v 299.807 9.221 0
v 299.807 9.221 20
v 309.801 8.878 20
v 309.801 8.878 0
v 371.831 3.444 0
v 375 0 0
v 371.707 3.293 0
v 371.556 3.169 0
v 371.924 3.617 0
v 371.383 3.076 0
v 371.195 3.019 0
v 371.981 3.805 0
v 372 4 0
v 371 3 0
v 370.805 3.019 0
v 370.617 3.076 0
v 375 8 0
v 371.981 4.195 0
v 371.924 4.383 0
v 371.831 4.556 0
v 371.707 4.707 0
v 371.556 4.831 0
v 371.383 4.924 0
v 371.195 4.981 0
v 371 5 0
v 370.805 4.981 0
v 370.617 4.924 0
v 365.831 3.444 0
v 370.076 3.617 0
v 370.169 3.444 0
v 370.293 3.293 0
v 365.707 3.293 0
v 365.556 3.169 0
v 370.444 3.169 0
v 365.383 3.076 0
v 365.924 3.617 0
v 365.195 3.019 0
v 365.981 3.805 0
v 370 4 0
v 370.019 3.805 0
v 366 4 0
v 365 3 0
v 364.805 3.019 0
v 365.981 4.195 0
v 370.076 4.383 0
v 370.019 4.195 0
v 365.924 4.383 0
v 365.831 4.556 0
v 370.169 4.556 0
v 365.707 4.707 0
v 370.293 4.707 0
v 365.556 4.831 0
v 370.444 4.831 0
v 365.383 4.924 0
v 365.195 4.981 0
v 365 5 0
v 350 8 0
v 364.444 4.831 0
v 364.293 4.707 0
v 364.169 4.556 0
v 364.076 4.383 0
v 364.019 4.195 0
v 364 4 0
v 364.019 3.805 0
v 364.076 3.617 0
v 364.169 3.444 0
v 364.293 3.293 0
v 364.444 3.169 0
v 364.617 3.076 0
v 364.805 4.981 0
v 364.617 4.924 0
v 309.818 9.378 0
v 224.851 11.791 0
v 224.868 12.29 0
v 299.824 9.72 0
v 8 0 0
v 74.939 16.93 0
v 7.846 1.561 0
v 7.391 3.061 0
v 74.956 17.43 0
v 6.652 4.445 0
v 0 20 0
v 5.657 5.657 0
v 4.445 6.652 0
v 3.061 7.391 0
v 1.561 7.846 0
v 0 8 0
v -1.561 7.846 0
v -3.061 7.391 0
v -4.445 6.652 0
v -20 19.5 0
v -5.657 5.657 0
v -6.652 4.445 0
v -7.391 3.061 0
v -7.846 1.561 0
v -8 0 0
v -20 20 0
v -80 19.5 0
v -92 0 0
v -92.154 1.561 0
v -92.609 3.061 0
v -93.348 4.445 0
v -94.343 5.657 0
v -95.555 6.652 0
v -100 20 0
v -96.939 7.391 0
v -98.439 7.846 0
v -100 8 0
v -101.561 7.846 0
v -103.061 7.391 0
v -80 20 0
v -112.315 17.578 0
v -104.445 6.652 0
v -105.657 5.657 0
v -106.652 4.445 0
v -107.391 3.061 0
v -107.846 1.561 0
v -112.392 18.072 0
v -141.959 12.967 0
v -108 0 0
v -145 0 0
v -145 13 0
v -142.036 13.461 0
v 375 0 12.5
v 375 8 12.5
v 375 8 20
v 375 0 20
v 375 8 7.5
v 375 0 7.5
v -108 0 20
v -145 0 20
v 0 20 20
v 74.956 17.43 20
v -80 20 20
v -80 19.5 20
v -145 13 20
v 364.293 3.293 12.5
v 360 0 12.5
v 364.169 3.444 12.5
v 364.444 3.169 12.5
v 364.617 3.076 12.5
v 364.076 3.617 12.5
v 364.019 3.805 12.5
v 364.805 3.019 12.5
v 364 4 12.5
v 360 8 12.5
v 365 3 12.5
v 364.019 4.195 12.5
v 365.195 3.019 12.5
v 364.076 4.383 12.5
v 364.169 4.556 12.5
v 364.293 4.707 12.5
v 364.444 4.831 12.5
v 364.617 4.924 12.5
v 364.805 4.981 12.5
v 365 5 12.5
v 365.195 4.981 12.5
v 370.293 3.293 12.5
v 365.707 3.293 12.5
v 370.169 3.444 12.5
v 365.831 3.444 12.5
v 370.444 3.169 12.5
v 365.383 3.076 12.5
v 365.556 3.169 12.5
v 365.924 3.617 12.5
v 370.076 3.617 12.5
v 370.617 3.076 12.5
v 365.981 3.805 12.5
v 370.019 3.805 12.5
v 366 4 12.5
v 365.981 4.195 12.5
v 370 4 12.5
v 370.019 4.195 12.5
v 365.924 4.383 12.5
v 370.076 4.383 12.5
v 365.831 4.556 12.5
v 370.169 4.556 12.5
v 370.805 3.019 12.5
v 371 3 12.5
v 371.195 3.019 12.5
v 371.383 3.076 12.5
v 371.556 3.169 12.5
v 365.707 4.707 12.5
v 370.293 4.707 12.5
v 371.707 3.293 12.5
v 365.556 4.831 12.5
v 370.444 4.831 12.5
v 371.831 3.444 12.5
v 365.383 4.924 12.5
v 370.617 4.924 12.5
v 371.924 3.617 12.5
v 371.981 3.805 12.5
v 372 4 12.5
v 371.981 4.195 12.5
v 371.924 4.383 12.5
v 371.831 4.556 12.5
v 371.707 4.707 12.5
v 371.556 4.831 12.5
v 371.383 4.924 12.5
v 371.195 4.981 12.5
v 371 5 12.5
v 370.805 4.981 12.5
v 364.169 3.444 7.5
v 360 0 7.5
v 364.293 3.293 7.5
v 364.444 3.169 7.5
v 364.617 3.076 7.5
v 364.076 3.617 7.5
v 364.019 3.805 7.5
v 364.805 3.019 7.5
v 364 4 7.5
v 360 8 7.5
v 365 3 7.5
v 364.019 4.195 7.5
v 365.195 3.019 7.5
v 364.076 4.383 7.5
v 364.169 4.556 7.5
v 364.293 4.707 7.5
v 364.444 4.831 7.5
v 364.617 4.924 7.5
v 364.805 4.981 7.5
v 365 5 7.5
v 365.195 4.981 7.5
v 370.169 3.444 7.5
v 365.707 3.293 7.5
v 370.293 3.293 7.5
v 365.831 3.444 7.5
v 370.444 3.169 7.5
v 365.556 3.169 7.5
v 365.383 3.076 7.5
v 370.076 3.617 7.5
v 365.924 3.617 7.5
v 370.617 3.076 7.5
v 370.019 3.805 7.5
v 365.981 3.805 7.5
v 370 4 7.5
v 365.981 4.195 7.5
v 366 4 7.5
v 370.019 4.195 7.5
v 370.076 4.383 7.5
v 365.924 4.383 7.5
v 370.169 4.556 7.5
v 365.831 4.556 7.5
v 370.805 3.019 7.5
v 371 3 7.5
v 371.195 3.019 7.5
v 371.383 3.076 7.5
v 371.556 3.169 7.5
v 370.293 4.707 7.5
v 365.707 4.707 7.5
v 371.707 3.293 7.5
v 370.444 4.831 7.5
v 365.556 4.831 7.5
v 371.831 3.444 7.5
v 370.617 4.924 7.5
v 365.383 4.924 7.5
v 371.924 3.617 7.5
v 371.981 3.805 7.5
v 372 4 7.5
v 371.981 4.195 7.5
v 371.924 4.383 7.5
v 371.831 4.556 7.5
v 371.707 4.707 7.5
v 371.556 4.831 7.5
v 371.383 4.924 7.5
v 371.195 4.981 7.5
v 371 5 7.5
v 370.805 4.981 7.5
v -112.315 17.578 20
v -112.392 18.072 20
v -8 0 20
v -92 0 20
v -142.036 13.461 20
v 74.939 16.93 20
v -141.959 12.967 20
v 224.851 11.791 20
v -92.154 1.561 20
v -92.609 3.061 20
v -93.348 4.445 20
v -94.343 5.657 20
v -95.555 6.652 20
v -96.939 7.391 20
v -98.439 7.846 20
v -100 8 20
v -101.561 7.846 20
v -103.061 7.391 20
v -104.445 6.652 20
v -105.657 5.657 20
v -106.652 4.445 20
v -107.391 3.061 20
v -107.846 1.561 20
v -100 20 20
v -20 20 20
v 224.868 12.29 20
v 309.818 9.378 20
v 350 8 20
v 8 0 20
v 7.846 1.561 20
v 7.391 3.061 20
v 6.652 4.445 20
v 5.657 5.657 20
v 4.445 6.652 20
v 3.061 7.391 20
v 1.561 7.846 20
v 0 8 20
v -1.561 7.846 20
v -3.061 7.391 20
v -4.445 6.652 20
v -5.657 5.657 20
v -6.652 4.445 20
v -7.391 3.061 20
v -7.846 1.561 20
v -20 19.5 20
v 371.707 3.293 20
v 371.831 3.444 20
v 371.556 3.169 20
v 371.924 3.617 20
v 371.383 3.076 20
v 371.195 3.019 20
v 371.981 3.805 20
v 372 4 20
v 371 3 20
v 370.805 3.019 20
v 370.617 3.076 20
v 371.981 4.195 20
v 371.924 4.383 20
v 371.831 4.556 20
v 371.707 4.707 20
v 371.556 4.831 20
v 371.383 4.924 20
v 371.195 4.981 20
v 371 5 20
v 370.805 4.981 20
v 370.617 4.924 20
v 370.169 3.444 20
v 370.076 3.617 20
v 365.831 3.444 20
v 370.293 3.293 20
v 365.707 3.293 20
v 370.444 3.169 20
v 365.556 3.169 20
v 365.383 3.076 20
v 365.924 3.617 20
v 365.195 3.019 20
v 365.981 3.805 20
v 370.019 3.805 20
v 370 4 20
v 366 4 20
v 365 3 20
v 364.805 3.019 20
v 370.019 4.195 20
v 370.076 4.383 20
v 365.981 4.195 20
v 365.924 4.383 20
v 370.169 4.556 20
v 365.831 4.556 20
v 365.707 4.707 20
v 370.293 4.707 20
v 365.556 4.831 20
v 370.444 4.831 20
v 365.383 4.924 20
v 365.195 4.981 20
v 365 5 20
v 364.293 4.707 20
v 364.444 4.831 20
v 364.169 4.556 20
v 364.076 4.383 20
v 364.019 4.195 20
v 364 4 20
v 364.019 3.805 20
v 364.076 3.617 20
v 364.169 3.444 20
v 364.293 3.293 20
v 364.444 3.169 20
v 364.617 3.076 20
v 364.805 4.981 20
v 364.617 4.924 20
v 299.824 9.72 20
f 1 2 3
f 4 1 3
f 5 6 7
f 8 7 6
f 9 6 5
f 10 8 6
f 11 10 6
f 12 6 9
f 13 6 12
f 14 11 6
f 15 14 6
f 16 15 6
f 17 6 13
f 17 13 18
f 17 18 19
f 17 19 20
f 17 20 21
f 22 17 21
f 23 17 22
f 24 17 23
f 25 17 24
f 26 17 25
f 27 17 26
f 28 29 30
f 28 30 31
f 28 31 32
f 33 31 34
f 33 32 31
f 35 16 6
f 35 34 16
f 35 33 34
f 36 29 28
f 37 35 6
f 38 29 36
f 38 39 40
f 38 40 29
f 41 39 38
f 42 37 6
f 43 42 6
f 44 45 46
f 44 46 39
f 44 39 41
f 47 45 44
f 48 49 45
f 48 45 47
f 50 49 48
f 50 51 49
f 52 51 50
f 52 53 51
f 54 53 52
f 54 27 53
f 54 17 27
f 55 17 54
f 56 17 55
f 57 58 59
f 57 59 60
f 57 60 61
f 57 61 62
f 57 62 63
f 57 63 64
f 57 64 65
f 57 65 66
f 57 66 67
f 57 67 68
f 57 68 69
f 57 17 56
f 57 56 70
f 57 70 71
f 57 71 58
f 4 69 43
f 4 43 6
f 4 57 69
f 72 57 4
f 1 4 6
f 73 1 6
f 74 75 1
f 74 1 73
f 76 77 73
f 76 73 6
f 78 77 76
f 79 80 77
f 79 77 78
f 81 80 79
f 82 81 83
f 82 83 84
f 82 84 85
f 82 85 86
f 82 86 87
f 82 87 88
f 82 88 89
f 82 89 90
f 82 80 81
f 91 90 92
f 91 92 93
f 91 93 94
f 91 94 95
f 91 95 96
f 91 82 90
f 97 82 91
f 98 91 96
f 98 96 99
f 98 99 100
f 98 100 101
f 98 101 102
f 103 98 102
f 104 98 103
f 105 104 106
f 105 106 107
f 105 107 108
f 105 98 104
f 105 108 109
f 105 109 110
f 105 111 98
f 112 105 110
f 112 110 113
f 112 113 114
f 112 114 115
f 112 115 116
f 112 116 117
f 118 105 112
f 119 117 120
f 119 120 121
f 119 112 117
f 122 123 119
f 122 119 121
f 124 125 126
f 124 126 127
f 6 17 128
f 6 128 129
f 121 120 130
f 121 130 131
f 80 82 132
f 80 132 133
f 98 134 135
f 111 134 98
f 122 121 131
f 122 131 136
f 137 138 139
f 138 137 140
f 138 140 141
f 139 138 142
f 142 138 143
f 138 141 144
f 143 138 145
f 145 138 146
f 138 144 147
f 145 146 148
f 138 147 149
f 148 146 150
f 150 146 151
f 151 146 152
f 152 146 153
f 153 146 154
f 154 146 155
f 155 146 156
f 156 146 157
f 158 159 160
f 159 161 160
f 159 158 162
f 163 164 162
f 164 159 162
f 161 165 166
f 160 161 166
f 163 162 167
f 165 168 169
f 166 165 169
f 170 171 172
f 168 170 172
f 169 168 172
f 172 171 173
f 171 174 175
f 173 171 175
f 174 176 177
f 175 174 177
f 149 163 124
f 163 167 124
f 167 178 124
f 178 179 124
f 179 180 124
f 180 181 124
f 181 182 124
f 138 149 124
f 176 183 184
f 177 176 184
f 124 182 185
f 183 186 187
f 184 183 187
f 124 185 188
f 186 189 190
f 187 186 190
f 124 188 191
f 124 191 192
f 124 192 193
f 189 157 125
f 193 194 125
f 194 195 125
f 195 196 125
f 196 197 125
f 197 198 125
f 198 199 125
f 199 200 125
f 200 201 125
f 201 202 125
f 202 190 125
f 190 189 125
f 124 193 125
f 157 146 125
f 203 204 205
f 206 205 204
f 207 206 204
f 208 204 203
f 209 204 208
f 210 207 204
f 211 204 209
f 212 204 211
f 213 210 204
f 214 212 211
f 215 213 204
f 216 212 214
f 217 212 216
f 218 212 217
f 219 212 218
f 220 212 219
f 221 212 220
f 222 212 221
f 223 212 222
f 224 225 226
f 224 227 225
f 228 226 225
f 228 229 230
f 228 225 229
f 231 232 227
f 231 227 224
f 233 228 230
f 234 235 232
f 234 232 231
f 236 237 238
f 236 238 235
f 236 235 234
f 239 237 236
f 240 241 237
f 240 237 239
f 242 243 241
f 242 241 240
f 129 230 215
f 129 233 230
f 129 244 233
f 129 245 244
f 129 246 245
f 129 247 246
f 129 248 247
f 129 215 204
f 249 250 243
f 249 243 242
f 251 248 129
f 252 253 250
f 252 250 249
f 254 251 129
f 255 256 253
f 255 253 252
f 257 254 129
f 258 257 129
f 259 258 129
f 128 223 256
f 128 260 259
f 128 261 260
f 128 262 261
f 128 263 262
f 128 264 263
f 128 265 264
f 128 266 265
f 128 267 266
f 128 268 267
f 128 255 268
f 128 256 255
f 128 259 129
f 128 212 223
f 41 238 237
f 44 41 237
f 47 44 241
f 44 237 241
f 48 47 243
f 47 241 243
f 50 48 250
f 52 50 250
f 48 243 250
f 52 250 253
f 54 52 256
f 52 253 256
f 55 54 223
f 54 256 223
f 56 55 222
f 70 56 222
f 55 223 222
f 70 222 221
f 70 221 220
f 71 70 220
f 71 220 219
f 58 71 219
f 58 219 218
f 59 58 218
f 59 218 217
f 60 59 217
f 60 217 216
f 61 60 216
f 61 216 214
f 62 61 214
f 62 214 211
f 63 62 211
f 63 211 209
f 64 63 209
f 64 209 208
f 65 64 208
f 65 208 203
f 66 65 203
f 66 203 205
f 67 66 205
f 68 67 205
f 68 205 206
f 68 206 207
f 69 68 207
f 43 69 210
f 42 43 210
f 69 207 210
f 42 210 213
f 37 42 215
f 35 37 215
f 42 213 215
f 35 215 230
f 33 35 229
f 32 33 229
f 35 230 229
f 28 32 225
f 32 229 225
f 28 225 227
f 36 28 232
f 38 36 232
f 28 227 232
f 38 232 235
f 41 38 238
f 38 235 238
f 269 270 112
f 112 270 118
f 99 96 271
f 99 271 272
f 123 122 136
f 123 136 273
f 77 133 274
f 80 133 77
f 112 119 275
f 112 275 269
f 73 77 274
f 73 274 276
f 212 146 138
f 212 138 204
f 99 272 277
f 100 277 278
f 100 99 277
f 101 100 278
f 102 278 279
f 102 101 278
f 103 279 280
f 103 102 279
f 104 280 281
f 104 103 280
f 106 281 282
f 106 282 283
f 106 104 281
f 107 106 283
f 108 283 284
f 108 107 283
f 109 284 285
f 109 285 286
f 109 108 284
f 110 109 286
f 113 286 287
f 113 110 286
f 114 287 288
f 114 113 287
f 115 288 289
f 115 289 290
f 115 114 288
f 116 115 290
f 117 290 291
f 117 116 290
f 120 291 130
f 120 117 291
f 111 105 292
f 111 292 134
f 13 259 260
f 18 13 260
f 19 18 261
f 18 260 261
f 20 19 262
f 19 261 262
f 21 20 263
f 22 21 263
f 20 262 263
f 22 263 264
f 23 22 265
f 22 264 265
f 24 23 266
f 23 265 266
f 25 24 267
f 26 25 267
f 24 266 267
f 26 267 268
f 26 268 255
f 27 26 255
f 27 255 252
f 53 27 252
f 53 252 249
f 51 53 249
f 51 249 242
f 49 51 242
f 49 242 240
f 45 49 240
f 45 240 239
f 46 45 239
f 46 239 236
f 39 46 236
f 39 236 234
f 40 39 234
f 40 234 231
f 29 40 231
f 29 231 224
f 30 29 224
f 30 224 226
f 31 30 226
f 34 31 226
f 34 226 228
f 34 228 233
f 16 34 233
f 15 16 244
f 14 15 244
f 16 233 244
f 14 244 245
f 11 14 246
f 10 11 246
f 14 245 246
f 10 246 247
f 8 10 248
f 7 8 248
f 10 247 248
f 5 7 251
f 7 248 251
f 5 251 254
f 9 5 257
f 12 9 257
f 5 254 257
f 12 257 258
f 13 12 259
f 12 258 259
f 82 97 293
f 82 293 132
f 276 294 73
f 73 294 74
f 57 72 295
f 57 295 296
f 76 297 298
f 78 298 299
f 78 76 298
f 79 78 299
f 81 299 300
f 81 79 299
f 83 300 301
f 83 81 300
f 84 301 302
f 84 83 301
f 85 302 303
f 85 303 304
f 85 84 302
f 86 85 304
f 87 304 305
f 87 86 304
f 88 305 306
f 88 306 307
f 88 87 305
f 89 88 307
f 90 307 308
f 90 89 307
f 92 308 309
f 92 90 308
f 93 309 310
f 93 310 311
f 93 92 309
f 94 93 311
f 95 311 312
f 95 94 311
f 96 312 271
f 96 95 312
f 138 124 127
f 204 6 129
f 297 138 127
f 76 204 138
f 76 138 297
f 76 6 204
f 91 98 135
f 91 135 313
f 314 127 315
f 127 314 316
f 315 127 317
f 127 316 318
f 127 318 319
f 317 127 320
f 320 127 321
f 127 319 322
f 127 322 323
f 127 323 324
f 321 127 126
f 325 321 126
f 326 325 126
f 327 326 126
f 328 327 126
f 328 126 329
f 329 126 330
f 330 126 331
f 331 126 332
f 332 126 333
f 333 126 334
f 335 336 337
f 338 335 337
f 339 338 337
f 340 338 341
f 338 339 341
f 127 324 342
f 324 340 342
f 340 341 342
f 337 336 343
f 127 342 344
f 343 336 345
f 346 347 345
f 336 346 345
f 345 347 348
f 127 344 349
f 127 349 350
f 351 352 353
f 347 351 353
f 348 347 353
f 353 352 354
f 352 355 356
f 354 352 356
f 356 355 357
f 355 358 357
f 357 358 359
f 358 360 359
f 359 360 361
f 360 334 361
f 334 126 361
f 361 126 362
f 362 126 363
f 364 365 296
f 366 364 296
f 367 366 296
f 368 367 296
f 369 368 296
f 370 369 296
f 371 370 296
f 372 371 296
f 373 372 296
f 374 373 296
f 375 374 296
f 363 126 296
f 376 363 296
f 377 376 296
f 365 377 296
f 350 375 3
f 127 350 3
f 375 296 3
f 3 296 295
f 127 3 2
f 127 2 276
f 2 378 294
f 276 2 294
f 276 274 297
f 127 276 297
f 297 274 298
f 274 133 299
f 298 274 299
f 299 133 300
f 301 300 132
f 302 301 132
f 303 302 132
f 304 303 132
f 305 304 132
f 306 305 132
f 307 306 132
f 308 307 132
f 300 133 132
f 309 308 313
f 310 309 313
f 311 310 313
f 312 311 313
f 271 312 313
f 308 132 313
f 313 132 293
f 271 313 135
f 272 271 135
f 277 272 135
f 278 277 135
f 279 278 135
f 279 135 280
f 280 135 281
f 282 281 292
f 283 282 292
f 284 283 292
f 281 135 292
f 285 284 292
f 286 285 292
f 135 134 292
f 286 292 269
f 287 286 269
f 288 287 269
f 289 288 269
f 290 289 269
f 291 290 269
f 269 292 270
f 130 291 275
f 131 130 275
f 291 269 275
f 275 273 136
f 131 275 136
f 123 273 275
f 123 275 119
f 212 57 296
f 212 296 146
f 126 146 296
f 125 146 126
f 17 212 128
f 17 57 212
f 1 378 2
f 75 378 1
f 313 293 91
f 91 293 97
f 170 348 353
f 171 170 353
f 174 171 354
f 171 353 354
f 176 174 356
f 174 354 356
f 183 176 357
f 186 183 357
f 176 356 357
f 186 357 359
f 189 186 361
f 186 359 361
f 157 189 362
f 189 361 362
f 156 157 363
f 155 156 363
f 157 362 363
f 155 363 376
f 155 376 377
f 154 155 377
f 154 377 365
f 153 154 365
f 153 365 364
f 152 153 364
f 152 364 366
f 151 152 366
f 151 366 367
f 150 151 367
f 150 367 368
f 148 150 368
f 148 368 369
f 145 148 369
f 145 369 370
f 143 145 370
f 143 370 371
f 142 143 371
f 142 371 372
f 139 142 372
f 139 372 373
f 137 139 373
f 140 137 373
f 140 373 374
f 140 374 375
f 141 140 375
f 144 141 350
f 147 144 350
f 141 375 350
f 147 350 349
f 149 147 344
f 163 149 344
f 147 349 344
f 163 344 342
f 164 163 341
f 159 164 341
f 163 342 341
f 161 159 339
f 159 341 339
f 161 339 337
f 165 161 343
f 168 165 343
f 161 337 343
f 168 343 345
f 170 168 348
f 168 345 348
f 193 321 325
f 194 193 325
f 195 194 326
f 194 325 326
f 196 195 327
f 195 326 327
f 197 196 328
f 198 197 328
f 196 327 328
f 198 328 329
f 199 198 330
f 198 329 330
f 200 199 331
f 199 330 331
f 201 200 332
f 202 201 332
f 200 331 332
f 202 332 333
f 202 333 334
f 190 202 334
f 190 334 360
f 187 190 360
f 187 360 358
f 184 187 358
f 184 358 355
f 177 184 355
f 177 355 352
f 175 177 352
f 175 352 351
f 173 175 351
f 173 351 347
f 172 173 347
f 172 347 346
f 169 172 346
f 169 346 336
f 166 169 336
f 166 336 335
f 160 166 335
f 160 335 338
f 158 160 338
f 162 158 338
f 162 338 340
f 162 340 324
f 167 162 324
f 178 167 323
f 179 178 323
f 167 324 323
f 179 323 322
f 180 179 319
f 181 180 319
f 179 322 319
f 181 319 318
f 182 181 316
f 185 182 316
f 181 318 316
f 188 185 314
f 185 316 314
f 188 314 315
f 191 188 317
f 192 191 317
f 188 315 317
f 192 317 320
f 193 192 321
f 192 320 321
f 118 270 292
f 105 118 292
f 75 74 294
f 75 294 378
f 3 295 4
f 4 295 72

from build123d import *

# Parameters (mm, degrees)
BOSS_EXTRUDE1_DEPTH = 20
SKETCH2_W           = 150
SKETCH2_H           = 20
SKETCH2_W_2         = 10
ROPEGROOVE1_DEPTH   = 0.5
SKETCH4_W           = 60
SKETCH4_H           = 20
ROPEGROOVE2_DEPTH   = 0.5
SKETCH5_W           = 30
SKETCH5_H           = 20
ROPEGROOVE3_DEPTH   = 0.5
SKETCH6_W           = 15
SKETCH6_H           = 5
CUT_EXTRUDE1_DEPTH  = 376.724633209
CUT_EXTRUDE2_DEPTH  = 377.065153929


with BuildPart() as part:
    # Sketch1 → Boss-Extrude1 (new body)
    with BuildSketch(Plane.XY):
        with BuildLine():
            Line((-8, 0), (-92, 0))
            ThreePointArc((-92, 0), (-100, 8), (-108, 0))
            Line((-108, 0), (-145, 0))
            Line((-145, 0), (-145, 13))
            Line((-145, 13), (-100, 20))
            Line((-100, 20), (0, 20))
            Line((0, 20), (350, 8))
            Line((350, 8), (375, 8))
            Line((375, 8), (375, 0))
            Line((375, 0), (8, 0))
            ThreePointArc((8, 0), (0, 8), (-8, 0))
        make_face()
    extrude(amount=BOSS_EXTRUDE1_DEPTH)

    # Sketch2 → RopeGroove1 (cut)
    with BuildSketch(Plane(origin=(0.684909168, 19.9765174, 0), x_dir=(0.9994127625749618, -0.03426558043114153, 0), z_dir=(0.034265580431141536, 0.9994127625749619, 0))):
        with Locations((149.314688391, -10)):
            Rectangle(SKETCH2_W, SKETCH2_H)
        with Locations((304.314688391, -10)):
            Rectangle(SKETCH2_W_2, SKETCH2_H)
    extrude(amount=-ROPEGROOVE1_DEPTH, mode=Mode.SUBTRACT)

    # Sketch4 → RopeGroove2 (cut)
    with BuildSketch(Plane(origin=(0, 20, 0), x_dir=(1, 0, 0), z_dir=(0, 1, 0))):
        with Locations((-50, -10)):
            Rectangle(SKETCH4_W, SKETCH4_H)
    extrude(amount=-ROPEGROOVE2_DEPTH, mode=Mode.SUBTRACT)

    # Sketch5 → RopeGroove3 (cut)
    with BuildSketch(Plane(origin=(-5.400192864, 34.715525554, 0), x_dir=(0.9881164689548824, 0.15370700628187053, 0), z_dir=(-0.15370700628187053, 0.9881164689548824, 0))):
        with Locations((-123.278696917, -10)):
            Rectangle(SKETCH5_W, SKETCH5_H)
    extrude(amount=-ROPEGROOVE3_DEPTH, mode=Mode.SUBTRACT)

    # Sketch6 → Cut-Extrude1 (cut, through all)
    with BuildSketch(Plane(origin=(0, 8, 0), x_dir=(1, 0, 0), z_dir=(0, 1, 0))):
        with Locations((367.5, -10)):
            Rectangle(SKETCH6_W, SKETCH6_H)
    extrude(amount=-CUT_EXTRUDE1_DEPTH, mode=Mode.SUBTRACT)

    # Sketch7 → Cut-Extrude2 (cut, through all)
    with BuildSketch(Plane.XY.offset(20)):
        with BuildLine():
            ThreePointArc((364, 4), (365, 3), (366, 4))
            Line((366, 4), (364, 4))
        make_face()
        with BuildLine():
            Line((364, 4), (366, 4))
            ThreePointArc((366, 4), (365, 5), (364, 4))
        make_face()
        with BuildLine():
            ThreePointArc((370, 4), (371, 3), (372, 4))
            Line((372, 4), (370, 4))
        make_face()
        with BuildLine():
            Line((370, 4), (372, 4))
            ThreePointArc((372, 4), (371, 5), (370, 4))
        make_face()
    extrude(amount=-CUT_EXTRUDE2_DEPTH, mode=Mode.SUBTRACT)


solid = part.part
